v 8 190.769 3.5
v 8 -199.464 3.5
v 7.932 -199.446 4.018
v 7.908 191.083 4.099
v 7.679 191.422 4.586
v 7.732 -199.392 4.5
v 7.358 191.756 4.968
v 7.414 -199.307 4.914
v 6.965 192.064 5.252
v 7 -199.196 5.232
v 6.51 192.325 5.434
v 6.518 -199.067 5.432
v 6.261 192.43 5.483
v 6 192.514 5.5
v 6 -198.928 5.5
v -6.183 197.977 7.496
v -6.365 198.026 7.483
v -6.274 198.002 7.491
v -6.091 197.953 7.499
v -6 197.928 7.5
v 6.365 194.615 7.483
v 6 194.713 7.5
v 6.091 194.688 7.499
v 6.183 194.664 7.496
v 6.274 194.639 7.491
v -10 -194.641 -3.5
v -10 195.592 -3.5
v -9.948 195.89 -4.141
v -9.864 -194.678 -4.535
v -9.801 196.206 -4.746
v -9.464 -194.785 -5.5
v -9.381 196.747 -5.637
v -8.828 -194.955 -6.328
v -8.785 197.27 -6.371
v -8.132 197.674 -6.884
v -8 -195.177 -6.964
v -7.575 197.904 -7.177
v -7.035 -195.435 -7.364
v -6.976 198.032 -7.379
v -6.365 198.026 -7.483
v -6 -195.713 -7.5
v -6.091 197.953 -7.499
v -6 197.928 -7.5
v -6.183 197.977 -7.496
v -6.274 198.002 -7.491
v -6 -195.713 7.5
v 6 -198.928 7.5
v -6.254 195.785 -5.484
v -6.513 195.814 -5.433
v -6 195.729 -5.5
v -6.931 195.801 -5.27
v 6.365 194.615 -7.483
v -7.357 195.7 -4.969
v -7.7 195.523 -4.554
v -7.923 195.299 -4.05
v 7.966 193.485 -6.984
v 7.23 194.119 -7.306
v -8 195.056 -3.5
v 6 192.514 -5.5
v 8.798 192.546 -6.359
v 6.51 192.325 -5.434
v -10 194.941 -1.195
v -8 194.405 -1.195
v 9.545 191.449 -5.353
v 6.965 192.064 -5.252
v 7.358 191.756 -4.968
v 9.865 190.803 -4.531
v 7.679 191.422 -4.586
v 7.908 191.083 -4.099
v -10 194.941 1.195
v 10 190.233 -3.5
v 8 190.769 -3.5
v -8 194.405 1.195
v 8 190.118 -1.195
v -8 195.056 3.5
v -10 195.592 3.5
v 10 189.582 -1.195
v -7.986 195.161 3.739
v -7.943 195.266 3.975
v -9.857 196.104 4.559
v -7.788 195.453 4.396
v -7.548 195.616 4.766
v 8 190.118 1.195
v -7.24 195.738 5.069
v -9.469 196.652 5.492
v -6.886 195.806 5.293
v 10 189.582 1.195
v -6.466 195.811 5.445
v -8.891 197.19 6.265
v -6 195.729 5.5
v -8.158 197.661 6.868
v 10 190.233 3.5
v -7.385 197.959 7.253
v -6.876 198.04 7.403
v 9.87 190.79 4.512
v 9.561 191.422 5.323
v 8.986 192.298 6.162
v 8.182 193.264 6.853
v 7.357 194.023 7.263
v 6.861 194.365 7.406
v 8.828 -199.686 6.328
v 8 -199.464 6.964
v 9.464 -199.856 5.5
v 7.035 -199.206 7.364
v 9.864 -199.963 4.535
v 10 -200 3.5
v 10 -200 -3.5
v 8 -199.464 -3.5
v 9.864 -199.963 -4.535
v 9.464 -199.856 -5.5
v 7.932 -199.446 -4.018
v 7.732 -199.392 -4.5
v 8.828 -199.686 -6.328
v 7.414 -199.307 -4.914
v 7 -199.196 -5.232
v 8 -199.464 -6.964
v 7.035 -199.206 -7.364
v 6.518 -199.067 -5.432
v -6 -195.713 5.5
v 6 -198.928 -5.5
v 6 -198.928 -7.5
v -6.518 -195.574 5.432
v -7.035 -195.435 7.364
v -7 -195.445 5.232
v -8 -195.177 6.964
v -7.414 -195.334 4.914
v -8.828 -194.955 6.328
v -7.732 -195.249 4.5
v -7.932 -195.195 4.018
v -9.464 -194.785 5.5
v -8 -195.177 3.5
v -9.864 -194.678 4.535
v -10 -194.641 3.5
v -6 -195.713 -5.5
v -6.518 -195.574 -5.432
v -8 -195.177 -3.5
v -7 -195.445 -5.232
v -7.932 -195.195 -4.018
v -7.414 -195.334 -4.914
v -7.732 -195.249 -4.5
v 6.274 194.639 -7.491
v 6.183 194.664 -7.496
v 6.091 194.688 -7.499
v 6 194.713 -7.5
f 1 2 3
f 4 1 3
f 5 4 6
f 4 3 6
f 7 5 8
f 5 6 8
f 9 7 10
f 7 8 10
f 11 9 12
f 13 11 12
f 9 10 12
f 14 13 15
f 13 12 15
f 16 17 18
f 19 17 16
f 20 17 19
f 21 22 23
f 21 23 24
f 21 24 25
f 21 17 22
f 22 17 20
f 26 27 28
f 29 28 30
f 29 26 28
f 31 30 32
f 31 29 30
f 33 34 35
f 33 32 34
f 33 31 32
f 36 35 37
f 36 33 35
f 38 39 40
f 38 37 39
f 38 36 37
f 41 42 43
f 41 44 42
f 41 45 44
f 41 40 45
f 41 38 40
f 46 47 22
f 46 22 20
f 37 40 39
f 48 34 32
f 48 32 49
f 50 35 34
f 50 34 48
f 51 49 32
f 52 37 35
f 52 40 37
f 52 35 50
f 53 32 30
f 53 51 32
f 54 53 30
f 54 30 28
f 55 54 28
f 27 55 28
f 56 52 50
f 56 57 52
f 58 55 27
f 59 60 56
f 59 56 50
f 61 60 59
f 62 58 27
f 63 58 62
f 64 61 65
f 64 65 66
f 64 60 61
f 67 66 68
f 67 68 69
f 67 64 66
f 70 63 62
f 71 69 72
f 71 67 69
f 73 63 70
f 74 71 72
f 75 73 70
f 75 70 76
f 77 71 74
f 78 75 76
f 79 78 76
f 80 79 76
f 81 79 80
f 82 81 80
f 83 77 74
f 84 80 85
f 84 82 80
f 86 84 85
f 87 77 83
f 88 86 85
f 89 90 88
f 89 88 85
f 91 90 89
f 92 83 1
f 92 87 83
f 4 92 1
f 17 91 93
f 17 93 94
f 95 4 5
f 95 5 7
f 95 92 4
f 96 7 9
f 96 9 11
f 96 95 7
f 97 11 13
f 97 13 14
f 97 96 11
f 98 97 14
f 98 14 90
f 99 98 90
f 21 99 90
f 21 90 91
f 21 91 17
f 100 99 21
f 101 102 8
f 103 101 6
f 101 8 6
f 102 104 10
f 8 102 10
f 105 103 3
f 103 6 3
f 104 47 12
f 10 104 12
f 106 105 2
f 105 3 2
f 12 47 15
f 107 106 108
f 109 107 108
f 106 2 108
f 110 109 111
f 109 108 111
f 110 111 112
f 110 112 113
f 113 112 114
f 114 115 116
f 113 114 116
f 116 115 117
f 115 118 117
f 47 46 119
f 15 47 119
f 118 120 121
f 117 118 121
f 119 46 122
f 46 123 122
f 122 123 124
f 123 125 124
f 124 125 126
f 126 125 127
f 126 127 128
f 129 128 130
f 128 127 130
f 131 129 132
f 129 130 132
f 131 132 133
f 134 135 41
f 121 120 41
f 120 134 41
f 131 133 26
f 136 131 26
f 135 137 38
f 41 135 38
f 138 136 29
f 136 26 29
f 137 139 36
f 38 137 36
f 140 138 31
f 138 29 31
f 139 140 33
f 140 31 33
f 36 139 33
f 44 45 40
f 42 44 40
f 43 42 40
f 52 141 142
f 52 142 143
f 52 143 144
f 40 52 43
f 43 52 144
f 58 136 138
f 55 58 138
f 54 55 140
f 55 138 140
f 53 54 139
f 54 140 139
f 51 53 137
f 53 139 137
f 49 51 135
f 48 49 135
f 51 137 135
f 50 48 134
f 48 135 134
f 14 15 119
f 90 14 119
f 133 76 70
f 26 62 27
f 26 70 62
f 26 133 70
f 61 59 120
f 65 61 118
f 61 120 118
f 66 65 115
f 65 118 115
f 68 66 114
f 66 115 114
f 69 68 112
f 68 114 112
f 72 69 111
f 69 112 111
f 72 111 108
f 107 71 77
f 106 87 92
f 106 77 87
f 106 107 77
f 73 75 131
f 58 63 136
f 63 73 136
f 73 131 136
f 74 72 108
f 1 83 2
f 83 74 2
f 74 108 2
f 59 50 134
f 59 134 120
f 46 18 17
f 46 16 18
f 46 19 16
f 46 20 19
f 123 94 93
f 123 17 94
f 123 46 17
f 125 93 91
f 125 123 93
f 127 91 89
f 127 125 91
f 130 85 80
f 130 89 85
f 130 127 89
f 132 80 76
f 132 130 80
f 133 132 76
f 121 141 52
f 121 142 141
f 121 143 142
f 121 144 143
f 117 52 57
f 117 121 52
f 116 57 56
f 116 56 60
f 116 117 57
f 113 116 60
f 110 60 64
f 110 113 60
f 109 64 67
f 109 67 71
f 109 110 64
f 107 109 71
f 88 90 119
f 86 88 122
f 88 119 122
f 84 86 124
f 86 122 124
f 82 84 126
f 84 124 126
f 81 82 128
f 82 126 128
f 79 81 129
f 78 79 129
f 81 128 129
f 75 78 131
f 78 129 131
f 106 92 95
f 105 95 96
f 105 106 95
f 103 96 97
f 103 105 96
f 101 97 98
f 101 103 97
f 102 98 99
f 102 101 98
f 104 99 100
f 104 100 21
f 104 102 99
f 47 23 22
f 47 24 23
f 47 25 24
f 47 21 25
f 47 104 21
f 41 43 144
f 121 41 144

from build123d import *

# Parameters (mm, degrees)
EXTRUDE_1_DEPTH          = 199
EXTRUDE_1_DEPTH_BACK     = 200
CUT_EXTRUDE_1_DEPTH      = 10
CUT_EXTRUDE_1_DEPTH_BACK = 30
SKETCH_3_R               = 9


with BuildPart() as part:
    # Эскиз1 → Вытянуть-Тонкостенный1 (new, two sides: drawn at the far end of the back side and taken through both)
    with BuildSketch(Plane(origin=(0, 0, 0), x_dir=(1, 0, 0), z_dir=(0, 1, 0)).offset(-EXTRUDE_1_DEPTH_BACK)):
        with BuildLine():
            Line((-6, 7.5), (6, 7.5))
            ThreePointArc((6, 7.5), (8.828427125, 6.328427125), (10, 3.5))
            Line((10, 3.5), (10, -3.5))
            ThreePointArc((10, -3.5), (8.828427125, -6.328427125), (6, -7.5))
            Line((6, -7.5), (-6, -7.5))
            ThreePointArc((-6, -7.5), (-8.828427125, -6.328427125), (-10, -3.5))
            Line((-10, -3.5), (-10, 3.5))
            ThreePointArc((-10, 3.5), (-8.828427125, 6.328427125), (-6, 7.5))
        make_face()
        with BuildLine():
            Line((-6, 5.5), (6, 5.5))
            ThreePointArc((6, 5.5), (7.414213562, 4.914213562), (8, 3.5))
            Line((8, 3.5), (8, -3.5))
            ThreePointArc((8, -3.5), (7.414213562, -4.914213562), (6, -5.5))
            Line((6, -5.5), (-6, -5.5))
            ThreePointArc((-6, -5.5), (-7.414213562, -4.914213562), (-8, -3.5))
            Line((-8, -3.5), (-8, 3.5))
            ThreePointArc((-8, 3.5), (-7.414213562, 4.914213562), (-6, 5.5))
        make_face(mode=Mode.SUBTRACT)
    extrude(amount=EXTRUDE_1_DEPTH + EXTRUDE_1_DEPTH_BACK)

    # Surface Cut 1
    split(bisect_by=Plane(origin=(49.080127019, 183.169527677, 0), x_dir=(0, 0, 1), z_dir=(0.25881904510252135, 0.9659258262890681, 0)), keep=Keep.BOTTOM)

    # Эскиз3 → Вырез-Вытянуть1 (cut, two sides: drawn at the far end of the back side and taken through both)
    with BuildSketch(Plane(origin=(-59.080127019, 15.830472323, 0), x_dir=(0, 0, 1), z_dir=(-0.9659258262890681, 0.25881904510252135, 0)).offset(-CUT_EXTRUDE_1_DEPTH_BACK)):
        with Locations((0, 194.63104898)):
            Circle(SKETCH_3_R)
    extrude(amount=CUT_EXTRUDE_1_DEPTH + CUT_EXTRUDE_1_DEPTH_BACK, mode=Mode.SUBTRACT)

    # Surface Cut 2
    split(bisect_by=Plane(origin=(-49.330127019, -184.102540378, 0), x_dir=(0, 0, -1), z_dir=(0.25881904510252135, 0.9659258262890681, 0)), keep=Keep.TOP)


solid = part.part
